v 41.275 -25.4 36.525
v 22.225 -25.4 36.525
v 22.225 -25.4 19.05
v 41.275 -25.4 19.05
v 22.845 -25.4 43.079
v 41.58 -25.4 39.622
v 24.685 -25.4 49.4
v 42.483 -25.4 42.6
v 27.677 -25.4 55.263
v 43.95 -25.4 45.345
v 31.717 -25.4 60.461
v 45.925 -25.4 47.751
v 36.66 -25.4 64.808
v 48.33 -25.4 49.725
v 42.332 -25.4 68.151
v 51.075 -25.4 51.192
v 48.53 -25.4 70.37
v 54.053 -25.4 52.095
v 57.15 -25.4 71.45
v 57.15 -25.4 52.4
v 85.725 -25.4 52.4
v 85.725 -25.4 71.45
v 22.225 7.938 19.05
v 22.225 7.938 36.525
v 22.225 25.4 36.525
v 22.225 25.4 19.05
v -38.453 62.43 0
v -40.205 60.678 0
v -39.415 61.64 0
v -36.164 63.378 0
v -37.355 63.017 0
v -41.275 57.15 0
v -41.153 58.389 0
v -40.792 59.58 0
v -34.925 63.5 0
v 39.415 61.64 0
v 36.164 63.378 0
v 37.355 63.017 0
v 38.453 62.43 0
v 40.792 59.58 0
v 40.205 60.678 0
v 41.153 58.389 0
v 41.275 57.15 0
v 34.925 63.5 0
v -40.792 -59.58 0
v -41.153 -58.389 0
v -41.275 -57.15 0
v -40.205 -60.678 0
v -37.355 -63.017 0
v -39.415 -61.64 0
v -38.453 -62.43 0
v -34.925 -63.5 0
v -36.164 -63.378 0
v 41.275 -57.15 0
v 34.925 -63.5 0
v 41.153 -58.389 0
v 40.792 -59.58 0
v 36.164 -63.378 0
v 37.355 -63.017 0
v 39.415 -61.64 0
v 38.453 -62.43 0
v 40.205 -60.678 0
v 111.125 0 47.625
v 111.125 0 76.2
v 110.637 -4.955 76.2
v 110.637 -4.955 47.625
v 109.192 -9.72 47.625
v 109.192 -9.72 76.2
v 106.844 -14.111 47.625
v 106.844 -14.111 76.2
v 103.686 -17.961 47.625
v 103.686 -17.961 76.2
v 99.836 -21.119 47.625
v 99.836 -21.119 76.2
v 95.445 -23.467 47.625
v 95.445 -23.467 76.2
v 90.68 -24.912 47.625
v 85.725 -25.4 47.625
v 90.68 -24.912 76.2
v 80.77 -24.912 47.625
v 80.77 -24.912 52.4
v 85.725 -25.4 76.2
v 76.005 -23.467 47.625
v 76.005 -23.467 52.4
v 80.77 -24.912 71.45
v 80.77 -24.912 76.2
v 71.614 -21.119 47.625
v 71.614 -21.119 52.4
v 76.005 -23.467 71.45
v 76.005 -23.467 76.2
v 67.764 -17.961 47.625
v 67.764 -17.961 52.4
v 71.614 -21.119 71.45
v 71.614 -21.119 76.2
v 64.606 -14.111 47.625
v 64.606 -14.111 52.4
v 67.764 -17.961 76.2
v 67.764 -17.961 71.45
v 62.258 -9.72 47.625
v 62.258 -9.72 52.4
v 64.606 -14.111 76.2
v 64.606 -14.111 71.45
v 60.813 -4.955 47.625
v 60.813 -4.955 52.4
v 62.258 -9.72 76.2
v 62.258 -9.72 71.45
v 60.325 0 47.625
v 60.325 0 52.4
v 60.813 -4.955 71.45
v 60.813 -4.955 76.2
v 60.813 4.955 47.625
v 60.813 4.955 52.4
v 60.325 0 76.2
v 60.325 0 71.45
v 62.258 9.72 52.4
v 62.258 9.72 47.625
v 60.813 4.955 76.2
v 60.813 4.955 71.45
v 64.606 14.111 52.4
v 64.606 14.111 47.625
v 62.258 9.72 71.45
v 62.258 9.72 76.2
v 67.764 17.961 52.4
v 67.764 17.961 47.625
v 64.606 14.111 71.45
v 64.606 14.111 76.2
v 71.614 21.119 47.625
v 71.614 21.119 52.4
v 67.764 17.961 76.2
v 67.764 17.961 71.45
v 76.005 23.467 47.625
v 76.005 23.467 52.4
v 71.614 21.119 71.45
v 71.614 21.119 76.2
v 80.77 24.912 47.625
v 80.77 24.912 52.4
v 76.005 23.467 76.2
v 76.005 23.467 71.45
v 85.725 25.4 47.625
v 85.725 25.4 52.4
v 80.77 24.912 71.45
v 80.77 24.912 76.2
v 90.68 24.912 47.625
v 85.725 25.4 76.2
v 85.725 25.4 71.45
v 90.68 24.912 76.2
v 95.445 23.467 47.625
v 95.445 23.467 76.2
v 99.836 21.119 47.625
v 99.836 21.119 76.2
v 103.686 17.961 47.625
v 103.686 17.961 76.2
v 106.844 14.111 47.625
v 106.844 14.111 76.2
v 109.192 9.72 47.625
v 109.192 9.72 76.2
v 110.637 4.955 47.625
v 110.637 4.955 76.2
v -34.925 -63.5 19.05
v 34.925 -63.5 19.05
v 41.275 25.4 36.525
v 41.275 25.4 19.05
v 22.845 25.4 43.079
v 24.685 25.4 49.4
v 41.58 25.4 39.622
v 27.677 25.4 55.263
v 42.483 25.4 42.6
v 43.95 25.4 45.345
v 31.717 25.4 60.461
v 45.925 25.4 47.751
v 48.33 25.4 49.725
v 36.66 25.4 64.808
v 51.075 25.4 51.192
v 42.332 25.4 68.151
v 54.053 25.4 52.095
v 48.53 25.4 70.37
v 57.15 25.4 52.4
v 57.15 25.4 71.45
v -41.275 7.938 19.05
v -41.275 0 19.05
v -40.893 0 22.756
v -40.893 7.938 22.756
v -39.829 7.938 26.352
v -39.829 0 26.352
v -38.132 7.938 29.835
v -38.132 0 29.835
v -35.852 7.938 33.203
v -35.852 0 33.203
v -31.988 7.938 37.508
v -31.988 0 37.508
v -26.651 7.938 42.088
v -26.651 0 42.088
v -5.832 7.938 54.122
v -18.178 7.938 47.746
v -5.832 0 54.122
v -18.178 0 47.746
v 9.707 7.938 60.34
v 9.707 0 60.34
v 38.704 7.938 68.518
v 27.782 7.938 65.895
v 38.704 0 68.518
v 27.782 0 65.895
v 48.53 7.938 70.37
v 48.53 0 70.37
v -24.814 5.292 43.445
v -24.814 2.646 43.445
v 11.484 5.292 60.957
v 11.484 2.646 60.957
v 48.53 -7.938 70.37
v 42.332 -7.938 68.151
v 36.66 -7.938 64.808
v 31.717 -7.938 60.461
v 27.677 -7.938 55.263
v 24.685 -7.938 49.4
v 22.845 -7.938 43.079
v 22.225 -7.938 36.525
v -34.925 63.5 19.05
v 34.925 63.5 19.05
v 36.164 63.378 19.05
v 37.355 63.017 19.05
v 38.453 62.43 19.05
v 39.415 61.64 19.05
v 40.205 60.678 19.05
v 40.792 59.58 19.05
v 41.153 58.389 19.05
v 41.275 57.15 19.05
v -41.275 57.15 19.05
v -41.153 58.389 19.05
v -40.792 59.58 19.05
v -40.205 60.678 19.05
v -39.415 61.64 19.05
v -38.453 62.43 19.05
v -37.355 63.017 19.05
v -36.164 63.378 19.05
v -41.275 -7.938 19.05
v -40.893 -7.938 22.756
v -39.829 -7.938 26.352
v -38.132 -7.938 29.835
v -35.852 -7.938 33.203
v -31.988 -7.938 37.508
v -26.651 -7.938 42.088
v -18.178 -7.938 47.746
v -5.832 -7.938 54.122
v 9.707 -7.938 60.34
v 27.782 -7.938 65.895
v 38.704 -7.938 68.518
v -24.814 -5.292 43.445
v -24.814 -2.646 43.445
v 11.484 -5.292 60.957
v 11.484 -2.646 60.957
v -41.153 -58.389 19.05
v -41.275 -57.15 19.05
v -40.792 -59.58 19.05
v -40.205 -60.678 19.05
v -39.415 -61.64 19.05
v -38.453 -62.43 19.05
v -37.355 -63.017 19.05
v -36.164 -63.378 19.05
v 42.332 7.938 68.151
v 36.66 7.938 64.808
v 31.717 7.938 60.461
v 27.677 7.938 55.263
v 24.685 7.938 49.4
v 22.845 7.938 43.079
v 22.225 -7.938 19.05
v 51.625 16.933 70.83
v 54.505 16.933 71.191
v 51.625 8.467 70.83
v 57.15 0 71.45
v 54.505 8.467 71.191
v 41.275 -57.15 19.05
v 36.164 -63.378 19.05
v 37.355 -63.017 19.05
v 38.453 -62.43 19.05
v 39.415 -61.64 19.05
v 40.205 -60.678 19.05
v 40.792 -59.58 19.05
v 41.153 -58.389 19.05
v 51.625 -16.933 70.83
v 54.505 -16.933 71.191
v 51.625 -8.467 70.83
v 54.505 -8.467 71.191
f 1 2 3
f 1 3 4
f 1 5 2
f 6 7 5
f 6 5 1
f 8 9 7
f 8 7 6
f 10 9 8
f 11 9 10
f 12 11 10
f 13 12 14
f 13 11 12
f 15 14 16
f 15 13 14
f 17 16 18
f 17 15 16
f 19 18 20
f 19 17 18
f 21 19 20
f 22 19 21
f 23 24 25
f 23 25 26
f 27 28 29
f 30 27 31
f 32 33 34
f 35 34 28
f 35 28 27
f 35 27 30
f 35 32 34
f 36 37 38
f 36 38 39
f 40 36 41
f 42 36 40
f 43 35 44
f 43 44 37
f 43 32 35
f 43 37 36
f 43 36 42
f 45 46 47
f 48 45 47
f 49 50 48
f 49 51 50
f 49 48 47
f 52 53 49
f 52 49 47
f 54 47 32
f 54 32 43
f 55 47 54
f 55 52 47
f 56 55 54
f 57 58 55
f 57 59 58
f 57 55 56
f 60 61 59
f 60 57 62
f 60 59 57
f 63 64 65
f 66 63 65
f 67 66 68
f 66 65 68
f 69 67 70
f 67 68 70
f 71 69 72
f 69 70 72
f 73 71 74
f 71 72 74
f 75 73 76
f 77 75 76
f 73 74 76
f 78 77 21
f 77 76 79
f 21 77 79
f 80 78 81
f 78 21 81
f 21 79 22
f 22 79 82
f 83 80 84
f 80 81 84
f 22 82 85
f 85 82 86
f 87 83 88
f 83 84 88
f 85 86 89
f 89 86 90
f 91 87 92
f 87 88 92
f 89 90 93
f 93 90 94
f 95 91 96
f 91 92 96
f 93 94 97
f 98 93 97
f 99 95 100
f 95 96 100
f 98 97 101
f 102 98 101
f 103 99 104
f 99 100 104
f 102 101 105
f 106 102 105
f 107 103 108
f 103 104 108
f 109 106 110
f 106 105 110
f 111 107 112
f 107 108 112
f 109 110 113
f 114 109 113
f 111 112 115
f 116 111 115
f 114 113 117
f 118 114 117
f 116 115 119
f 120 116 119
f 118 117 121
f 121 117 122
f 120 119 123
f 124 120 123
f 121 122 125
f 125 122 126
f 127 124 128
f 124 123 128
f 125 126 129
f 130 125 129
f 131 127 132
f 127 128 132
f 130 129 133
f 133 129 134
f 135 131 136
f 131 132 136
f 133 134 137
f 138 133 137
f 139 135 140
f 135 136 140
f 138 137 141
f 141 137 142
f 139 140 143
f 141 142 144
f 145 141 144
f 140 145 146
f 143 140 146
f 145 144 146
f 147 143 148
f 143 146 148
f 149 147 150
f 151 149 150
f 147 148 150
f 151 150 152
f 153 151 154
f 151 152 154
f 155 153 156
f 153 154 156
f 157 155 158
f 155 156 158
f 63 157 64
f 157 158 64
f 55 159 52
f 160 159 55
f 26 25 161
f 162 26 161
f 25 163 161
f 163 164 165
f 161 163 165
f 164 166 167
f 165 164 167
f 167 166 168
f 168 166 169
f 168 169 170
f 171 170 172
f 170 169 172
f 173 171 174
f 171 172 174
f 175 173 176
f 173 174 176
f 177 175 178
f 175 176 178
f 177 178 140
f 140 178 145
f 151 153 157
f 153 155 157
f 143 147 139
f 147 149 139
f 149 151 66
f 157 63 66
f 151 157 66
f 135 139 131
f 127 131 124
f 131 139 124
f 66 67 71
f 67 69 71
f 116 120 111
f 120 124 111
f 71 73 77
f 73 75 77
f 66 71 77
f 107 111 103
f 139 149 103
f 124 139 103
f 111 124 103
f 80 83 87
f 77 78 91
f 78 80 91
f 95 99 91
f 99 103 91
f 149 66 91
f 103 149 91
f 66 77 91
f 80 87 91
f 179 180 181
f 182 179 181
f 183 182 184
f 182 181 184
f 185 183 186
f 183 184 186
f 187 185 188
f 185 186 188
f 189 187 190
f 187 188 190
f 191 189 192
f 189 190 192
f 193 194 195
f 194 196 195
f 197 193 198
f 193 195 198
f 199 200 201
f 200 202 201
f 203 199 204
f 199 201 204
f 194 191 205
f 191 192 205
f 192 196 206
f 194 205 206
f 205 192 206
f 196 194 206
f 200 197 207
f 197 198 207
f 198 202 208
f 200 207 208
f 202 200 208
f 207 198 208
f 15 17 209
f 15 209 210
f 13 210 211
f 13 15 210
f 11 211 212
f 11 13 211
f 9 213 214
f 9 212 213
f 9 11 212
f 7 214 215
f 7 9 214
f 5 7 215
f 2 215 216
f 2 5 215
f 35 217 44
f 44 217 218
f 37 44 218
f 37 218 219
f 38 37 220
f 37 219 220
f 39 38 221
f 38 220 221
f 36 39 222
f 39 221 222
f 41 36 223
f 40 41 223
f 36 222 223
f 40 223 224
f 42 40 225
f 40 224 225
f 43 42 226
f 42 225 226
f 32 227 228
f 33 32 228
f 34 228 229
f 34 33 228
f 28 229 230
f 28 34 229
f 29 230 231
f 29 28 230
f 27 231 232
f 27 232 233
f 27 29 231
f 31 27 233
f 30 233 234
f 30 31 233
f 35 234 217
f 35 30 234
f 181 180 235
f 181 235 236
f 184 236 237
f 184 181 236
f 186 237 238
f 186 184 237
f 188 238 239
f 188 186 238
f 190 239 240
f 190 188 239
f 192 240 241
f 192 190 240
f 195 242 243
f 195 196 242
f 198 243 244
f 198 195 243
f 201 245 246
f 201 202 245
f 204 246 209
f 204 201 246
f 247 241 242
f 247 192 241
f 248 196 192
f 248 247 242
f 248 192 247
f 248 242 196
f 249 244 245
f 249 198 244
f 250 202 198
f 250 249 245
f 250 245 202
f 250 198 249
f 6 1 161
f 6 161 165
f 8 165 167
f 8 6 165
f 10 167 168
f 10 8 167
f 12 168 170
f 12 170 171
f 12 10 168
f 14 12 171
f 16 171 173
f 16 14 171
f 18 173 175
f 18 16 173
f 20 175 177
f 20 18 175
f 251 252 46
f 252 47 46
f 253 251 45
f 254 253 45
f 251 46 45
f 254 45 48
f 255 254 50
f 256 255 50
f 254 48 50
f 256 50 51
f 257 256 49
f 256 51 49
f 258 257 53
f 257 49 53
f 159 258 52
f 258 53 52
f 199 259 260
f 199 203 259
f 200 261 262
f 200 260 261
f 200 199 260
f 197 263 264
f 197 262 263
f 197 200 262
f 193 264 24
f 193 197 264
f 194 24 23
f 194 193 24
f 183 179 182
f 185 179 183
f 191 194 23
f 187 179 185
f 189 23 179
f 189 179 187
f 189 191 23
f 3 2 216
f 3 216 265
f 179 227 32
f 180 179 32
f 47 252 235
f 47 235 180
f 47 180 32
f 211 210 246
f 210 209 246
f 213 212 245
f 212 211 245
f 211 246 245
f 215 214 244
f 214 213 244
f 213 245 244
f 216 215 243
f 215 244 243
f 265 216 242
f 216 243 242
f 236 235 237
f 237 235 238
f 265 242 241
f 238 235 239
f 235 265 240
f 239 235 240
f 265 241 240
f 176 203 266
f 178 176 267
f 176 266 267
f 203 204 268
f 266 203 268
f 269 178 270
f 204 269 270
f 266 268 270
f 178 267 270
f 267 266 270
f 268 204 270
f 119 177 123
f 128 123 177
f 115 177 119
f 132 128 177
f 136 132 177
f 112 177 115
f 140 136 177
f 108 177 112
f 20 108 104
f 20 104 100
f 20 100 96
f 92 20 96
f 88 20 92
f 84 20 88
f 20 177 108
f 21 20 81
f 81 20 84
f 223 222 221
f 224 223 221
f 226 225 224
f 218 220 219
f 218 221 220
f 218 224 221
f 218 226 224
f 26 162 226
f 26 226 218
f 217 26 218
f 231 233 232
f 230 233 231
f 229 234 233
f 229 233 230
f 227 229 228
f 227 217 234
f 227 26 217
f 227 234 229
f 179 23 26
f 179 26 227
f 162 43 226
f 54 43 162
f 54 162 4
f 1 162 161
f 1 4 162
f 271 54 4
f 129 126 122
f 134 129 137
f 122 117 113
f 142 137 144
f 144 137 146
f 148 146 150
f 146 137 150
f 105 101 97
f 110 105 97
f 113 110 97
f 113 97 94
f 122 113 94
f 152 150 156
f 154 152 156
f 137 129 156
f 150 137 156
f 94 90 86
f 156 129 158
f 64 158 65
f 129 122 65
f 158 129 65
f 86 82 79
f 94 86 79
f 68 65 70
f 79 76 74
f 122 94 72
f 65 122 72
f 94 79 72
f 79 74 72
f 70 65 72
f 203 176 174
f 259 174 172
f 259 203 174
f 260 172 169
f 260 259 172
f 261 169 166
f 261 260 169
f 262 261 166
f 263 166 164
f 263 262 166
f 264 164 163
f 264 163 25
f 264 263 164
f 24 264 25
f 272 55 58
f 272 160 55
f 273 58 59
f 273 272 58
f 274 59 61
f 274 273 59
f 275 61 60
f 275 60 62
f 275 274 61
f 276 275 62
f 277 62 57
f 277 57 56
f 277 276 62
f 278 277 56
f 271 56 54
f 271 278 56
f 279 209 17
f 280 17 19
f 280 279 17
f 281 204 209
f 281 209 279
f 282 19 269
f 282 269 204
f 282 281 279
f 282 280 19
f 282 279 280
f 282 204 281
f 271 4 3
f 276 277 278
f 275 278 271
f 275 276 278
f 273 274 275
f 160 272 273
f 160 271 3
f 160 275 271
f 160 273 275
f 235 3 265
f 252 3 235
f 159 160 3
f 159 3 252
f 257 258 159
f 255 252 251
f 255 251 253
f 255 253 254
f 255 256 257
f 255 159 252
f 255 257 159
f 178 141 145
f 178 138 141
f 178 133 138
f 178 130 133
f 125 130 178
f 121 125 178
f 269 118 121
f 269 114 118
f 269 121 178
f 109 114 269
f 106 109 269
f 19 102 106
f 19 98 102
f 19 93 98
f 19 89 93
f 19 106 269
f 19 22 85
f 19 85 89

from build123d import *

# Parameters (mm, degrees)
F1_DEPTH = 63.5
F0_W     = 25.4
F0_H     = 19.05
F2_DEPTH = 25.4
F3_DEPTH = 7.9375
F4_R     = 6.35


with BuildPart() as f1:
    # F0 (on Front) → F1 (new body, symmetric)
    with BuildSketch(Plane.XZ):
        Polygon((22.225, 19.05), (-41.275, 19.05), (-41.275, 0), (41.275, 0), (41.275, 19.05), align=None)
    extrude(amount=F1_DEPTH, both=True)

    # F0 (on Front) → F2 (join, symmetric)
    with BuildSketch(Plane.XZ):
        with BuildLine():
            Line((22.225, 36.5252), (22.225, 19.05))
            Line((22.225, 19.05), (41.275, 19.05))
            Line((41.275, 19.05), (41.275, 36.5252))
            ThreePointArc((41.275, 36.5252), (45.9246798487, 47.7505201513), (57.15, 52.4002))
            Line((57.15, 52.4002), (60.325, 52.4002))
            Line((60.325, 52.4002), (60.325, 71.4502))
            Line((60.325, 71.4502), (57.15, 71.4502))
            add(Edge.make_bspline(
                [(48.5295077418, 70.3695900555), (51.7256176112, 70.8797706122), (54.6303264693, 71.2419617034), (57.15, 71.4502)],
                knots=[101.0999691386, 101.0999691386, 101.0999691386, 101.0999691386, 111.5045361635, 111.5045361635, 111.5045361635, 111.5045361635], degree=3))
            ThreePointArc((48.5295077418, 70.3695900555), (29.5744100959, 57.9574762777), (22.225, 36.5252))
        make_face()
        with Locations((73.025, 61.9252)):
            Rectangle(F0_W, F0_H)
    extrude(amount=F2_DEPTH, both=True)

    # F0 (on Front) → F3 (join, symmetric)
    with BuildSketch(Plane.XZ):
        with BuildLine():
            add(Edge.make_bspline(
                [(-41.275, 19.05), (-41.096400475, 46.4820152223), (17.4732794163, 65.4122248504), (48.5295077418, 70.3695900555)],
                knots=[0, 0, 0, 0, 101.0999691386, 101.0999691386, 101.0999691386, 101.0999691386], degree=3))
            Line((-41.275, 19.05), (22.225, 19.05))
            Line((22.225, 19.05), (22.225, 36.5252))
            ThreePointArc((22.225, 36.5252), (29.5744100959, 57.9574762777), (48.5295077418, 70.3695900555))
        make_face()
    extrude(amount=F3_DEPTH, both=True)

    # F4
    f4_edges = [f1.edges().sort_by_distance(p)[0] for p in [
        (41.275, -63.5, 9.525),
        (-41.275, -63.5, 9.525),
        (-41.275, 63.5, 9.525),
        (41.275, 63.5, 9.525),
    ]]
    fillet(f4_edges, radius=F4_R)

    # F0 (on Front) → F5 (revolve)
    with BuildSketch(Plane.XZ):
        Polygon((85.725, 76.2), (85.725, 71.4502), (85.725, 52.4002), (85.725, 47.625), (111.125, 47.625), (111.125, 76.2), align=None)
    revolve(axis=Axis((85.725, 0, 61.9125), (0, 0, -1)))


solid = f1.part
